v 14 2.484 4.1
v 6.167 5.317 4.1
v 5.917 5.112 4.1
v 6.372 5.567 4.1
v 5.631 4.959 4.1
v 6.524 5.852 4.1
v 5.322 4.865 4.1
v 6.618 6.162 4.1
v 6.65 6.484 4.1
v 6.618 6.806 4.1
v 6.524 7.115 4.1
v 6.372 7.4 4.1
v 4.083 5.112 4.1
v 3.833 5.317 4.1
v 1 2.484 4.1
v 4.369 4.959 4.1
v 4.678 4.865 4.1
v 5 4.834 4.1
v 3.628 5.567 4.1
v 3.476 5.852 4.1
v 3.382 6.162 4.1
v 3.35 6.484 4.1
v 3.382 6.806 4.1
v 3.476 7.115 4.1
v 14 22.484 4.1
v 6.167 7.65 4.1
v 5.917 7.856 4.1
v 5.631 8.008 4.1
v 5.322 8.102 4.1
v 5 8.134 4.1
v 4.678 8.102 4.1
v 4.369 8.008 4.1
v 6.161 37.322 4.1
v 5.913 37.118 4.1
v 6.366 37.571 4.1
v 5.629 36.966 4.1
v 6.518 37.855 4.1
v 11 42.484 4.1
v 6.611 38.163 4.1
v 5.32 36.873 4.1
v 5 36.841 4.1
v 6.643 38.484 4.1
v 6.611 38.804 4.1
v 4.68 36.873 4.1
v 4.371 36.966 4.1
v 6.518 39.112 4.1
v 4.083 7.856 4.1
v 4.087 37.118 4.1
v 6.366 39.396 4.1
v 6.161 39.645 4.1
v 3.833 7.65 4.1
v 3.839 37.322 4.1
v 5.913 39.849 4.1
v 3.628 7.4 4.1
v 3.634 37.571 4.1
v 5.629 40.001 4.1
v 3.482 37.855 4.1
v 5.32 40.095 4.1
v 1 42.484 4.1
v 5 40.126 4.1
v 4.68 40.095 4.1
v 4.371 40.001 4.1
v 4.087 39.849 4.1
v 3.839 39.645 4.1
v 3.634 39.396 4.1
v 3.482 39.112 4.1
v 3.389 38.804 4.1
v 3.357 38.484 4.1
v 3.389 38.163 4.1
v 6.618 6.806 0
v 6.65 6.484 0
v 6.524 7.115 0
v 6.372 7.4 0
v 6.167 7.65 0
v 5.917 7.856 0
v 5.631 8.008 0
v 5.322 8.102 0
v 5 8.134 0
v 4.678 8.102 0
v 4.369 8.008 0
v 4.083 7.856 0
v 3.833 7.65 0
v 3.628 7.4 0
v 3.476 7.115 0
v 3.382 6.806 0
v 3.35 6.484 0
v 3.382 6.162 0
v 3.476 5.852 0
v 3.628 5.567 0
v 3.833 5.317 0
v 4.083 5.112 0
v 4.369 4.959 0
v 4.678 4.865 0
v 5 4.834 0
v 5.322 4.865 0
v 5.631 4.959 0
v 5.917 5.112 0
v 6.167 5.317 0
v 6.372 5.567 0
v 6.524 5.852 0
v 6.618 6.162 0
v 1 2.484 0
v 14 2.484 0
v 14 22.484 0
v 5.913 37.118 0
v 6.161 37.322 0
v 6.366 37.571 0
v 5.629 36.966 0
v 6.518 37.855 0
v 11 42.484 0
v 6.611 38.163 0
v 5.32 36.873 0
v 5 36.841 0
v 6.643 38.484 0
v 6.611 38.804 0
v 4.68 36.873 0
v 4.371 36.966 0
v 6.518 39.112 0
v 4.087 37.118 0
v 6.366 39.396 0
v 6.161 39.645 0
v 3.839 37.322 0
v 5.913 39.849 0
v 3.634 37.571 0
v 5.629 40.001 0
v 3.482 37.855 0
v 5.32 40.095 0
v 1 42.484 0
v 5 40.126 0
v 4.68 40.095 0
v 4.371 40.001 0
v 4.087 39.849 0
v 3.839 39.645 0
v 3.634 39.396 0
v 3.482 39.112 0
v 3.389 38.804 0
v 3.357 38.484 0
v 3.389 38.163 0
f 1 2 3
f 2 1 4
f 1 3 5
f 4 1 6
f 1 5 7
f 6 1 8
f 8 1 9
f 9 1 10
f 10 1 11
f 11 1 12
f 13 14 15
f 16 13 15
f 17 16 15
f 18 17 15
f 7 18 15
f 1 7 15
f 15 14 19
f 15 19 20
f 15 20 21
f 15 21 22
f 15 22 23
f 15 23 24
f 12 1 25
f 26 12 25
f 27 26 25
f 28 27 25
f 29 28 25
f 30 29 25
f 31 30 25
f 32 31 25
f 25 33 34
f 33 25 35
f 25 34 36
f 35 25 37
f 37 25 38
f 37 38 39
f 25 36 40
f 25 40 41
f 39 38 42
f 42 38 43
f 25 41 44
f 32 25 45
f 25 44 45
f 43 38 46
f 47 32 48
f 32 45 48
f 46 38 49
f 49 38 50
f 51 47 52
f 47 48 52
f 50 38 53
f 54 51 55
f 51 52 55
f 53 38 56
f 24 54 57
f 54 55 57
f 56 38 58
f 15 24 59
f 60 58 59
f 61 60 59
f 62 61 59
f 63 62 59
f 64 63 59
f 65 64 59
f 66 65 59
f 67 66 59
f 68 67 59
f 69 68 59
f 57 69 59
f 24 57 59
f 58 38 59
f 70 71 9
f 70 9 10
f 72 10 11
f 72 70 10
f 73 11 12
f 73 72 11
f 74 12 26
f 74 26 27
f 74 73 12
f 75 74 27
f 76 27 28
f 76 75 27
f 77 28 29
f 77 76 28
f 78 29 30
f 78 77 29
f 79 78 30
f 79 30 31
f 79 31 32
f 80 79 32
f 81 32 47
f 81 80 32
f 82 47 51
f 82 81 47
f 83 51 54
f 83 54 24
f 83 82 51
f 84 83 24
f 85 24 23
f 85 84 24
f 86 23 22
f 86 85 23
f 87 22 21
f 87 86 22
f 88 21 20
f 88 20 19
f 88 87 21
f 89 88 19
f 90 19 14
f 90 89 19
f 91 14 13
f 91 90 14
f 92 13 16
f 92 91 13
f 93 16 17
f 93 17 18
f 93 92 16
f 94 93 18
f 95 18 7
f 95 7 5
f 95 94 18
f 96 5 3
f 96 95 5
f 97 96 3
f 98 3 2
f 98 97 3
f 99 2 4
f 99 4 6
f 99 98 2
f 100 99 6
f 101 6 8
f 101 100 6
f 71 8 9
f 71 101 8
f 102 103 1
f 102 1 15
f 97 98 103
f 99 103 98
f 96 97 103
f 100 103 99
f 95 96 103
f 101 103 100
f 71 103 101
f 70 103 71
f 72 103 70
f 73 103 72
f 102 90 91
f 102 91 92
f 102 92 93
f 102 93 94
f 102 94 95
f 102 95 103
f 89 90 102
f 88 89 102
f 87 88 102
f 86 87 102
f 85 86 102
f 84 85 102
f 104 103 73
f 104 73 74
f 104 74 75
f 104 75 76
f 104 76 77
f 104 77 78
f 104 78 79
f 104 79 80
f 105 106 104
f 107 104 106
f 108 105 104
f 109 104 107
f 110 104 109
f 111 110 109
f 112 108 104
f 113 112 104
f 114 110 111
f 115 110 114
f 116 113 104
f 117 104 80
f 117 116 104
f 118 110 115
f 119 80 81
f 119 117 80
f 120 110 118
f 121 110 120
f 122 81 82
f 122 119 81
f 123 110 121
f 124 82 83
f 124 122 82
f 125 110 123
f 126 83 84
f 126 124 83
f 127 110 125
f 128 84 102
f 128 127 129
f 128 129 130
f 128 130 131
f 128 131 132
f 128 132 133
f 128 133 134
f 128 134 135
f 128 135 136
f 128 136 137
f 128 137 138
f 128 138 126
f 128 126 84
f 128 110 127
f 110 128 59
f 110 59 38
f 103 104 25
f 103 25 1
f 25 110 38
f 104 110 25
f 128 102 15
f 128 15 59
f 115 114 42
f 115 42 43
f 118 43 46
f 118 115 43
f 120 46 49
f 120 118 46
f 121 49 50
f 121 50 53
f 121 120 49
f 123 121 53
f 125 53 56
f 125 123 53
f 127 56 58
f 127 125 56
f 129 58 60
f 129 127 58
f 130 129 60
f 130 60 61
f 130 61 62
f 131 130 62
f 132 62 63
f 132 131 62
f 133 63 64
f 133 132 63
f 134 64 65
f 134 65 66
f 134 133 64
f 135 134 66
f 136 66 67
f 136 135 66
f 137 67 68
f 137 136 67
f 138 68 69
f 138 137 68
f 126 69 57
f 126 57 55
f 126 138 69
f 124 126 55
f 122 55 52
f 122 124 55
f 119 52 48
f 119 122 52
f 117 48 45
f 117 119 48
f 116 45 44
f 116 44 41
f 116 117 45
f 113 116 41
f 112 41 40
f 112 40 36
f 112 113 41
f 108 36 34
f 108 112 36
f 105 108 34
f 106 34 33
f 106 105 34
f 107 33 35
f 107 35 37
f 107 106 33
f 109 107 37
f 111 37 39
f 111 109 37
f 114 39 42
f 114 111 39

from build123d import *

# Parameters (mm, degrees)
SKETCH1_R           = 1.65
SKETCH1_R_2         = 1.642532795
BOSS_EXTRUDE1_DEPTH = 4.1


with BuildPart() as part:
    # Sketch1 → Boss-Extrude1 (new body)
    with BuildSketch(Plane.XY):
        Polygon((1, 2.483732861), (1, 42.483732861), (11, 42.483732861), (14, 22.483732861), (14, 2.483732861), align=None)
        with Locations((5, 6.483732861)):
            Circle(SKETCH1_R, mode=Mode.SUBTRACT)
        with Locations((5, 38.483732861)):
            Circle(SKETCH1_R_2, mode=Mode.SUBTRACT)
    extrude(amount=BOSS_EXTRUDE1_DEPTH)


solid = part.part
